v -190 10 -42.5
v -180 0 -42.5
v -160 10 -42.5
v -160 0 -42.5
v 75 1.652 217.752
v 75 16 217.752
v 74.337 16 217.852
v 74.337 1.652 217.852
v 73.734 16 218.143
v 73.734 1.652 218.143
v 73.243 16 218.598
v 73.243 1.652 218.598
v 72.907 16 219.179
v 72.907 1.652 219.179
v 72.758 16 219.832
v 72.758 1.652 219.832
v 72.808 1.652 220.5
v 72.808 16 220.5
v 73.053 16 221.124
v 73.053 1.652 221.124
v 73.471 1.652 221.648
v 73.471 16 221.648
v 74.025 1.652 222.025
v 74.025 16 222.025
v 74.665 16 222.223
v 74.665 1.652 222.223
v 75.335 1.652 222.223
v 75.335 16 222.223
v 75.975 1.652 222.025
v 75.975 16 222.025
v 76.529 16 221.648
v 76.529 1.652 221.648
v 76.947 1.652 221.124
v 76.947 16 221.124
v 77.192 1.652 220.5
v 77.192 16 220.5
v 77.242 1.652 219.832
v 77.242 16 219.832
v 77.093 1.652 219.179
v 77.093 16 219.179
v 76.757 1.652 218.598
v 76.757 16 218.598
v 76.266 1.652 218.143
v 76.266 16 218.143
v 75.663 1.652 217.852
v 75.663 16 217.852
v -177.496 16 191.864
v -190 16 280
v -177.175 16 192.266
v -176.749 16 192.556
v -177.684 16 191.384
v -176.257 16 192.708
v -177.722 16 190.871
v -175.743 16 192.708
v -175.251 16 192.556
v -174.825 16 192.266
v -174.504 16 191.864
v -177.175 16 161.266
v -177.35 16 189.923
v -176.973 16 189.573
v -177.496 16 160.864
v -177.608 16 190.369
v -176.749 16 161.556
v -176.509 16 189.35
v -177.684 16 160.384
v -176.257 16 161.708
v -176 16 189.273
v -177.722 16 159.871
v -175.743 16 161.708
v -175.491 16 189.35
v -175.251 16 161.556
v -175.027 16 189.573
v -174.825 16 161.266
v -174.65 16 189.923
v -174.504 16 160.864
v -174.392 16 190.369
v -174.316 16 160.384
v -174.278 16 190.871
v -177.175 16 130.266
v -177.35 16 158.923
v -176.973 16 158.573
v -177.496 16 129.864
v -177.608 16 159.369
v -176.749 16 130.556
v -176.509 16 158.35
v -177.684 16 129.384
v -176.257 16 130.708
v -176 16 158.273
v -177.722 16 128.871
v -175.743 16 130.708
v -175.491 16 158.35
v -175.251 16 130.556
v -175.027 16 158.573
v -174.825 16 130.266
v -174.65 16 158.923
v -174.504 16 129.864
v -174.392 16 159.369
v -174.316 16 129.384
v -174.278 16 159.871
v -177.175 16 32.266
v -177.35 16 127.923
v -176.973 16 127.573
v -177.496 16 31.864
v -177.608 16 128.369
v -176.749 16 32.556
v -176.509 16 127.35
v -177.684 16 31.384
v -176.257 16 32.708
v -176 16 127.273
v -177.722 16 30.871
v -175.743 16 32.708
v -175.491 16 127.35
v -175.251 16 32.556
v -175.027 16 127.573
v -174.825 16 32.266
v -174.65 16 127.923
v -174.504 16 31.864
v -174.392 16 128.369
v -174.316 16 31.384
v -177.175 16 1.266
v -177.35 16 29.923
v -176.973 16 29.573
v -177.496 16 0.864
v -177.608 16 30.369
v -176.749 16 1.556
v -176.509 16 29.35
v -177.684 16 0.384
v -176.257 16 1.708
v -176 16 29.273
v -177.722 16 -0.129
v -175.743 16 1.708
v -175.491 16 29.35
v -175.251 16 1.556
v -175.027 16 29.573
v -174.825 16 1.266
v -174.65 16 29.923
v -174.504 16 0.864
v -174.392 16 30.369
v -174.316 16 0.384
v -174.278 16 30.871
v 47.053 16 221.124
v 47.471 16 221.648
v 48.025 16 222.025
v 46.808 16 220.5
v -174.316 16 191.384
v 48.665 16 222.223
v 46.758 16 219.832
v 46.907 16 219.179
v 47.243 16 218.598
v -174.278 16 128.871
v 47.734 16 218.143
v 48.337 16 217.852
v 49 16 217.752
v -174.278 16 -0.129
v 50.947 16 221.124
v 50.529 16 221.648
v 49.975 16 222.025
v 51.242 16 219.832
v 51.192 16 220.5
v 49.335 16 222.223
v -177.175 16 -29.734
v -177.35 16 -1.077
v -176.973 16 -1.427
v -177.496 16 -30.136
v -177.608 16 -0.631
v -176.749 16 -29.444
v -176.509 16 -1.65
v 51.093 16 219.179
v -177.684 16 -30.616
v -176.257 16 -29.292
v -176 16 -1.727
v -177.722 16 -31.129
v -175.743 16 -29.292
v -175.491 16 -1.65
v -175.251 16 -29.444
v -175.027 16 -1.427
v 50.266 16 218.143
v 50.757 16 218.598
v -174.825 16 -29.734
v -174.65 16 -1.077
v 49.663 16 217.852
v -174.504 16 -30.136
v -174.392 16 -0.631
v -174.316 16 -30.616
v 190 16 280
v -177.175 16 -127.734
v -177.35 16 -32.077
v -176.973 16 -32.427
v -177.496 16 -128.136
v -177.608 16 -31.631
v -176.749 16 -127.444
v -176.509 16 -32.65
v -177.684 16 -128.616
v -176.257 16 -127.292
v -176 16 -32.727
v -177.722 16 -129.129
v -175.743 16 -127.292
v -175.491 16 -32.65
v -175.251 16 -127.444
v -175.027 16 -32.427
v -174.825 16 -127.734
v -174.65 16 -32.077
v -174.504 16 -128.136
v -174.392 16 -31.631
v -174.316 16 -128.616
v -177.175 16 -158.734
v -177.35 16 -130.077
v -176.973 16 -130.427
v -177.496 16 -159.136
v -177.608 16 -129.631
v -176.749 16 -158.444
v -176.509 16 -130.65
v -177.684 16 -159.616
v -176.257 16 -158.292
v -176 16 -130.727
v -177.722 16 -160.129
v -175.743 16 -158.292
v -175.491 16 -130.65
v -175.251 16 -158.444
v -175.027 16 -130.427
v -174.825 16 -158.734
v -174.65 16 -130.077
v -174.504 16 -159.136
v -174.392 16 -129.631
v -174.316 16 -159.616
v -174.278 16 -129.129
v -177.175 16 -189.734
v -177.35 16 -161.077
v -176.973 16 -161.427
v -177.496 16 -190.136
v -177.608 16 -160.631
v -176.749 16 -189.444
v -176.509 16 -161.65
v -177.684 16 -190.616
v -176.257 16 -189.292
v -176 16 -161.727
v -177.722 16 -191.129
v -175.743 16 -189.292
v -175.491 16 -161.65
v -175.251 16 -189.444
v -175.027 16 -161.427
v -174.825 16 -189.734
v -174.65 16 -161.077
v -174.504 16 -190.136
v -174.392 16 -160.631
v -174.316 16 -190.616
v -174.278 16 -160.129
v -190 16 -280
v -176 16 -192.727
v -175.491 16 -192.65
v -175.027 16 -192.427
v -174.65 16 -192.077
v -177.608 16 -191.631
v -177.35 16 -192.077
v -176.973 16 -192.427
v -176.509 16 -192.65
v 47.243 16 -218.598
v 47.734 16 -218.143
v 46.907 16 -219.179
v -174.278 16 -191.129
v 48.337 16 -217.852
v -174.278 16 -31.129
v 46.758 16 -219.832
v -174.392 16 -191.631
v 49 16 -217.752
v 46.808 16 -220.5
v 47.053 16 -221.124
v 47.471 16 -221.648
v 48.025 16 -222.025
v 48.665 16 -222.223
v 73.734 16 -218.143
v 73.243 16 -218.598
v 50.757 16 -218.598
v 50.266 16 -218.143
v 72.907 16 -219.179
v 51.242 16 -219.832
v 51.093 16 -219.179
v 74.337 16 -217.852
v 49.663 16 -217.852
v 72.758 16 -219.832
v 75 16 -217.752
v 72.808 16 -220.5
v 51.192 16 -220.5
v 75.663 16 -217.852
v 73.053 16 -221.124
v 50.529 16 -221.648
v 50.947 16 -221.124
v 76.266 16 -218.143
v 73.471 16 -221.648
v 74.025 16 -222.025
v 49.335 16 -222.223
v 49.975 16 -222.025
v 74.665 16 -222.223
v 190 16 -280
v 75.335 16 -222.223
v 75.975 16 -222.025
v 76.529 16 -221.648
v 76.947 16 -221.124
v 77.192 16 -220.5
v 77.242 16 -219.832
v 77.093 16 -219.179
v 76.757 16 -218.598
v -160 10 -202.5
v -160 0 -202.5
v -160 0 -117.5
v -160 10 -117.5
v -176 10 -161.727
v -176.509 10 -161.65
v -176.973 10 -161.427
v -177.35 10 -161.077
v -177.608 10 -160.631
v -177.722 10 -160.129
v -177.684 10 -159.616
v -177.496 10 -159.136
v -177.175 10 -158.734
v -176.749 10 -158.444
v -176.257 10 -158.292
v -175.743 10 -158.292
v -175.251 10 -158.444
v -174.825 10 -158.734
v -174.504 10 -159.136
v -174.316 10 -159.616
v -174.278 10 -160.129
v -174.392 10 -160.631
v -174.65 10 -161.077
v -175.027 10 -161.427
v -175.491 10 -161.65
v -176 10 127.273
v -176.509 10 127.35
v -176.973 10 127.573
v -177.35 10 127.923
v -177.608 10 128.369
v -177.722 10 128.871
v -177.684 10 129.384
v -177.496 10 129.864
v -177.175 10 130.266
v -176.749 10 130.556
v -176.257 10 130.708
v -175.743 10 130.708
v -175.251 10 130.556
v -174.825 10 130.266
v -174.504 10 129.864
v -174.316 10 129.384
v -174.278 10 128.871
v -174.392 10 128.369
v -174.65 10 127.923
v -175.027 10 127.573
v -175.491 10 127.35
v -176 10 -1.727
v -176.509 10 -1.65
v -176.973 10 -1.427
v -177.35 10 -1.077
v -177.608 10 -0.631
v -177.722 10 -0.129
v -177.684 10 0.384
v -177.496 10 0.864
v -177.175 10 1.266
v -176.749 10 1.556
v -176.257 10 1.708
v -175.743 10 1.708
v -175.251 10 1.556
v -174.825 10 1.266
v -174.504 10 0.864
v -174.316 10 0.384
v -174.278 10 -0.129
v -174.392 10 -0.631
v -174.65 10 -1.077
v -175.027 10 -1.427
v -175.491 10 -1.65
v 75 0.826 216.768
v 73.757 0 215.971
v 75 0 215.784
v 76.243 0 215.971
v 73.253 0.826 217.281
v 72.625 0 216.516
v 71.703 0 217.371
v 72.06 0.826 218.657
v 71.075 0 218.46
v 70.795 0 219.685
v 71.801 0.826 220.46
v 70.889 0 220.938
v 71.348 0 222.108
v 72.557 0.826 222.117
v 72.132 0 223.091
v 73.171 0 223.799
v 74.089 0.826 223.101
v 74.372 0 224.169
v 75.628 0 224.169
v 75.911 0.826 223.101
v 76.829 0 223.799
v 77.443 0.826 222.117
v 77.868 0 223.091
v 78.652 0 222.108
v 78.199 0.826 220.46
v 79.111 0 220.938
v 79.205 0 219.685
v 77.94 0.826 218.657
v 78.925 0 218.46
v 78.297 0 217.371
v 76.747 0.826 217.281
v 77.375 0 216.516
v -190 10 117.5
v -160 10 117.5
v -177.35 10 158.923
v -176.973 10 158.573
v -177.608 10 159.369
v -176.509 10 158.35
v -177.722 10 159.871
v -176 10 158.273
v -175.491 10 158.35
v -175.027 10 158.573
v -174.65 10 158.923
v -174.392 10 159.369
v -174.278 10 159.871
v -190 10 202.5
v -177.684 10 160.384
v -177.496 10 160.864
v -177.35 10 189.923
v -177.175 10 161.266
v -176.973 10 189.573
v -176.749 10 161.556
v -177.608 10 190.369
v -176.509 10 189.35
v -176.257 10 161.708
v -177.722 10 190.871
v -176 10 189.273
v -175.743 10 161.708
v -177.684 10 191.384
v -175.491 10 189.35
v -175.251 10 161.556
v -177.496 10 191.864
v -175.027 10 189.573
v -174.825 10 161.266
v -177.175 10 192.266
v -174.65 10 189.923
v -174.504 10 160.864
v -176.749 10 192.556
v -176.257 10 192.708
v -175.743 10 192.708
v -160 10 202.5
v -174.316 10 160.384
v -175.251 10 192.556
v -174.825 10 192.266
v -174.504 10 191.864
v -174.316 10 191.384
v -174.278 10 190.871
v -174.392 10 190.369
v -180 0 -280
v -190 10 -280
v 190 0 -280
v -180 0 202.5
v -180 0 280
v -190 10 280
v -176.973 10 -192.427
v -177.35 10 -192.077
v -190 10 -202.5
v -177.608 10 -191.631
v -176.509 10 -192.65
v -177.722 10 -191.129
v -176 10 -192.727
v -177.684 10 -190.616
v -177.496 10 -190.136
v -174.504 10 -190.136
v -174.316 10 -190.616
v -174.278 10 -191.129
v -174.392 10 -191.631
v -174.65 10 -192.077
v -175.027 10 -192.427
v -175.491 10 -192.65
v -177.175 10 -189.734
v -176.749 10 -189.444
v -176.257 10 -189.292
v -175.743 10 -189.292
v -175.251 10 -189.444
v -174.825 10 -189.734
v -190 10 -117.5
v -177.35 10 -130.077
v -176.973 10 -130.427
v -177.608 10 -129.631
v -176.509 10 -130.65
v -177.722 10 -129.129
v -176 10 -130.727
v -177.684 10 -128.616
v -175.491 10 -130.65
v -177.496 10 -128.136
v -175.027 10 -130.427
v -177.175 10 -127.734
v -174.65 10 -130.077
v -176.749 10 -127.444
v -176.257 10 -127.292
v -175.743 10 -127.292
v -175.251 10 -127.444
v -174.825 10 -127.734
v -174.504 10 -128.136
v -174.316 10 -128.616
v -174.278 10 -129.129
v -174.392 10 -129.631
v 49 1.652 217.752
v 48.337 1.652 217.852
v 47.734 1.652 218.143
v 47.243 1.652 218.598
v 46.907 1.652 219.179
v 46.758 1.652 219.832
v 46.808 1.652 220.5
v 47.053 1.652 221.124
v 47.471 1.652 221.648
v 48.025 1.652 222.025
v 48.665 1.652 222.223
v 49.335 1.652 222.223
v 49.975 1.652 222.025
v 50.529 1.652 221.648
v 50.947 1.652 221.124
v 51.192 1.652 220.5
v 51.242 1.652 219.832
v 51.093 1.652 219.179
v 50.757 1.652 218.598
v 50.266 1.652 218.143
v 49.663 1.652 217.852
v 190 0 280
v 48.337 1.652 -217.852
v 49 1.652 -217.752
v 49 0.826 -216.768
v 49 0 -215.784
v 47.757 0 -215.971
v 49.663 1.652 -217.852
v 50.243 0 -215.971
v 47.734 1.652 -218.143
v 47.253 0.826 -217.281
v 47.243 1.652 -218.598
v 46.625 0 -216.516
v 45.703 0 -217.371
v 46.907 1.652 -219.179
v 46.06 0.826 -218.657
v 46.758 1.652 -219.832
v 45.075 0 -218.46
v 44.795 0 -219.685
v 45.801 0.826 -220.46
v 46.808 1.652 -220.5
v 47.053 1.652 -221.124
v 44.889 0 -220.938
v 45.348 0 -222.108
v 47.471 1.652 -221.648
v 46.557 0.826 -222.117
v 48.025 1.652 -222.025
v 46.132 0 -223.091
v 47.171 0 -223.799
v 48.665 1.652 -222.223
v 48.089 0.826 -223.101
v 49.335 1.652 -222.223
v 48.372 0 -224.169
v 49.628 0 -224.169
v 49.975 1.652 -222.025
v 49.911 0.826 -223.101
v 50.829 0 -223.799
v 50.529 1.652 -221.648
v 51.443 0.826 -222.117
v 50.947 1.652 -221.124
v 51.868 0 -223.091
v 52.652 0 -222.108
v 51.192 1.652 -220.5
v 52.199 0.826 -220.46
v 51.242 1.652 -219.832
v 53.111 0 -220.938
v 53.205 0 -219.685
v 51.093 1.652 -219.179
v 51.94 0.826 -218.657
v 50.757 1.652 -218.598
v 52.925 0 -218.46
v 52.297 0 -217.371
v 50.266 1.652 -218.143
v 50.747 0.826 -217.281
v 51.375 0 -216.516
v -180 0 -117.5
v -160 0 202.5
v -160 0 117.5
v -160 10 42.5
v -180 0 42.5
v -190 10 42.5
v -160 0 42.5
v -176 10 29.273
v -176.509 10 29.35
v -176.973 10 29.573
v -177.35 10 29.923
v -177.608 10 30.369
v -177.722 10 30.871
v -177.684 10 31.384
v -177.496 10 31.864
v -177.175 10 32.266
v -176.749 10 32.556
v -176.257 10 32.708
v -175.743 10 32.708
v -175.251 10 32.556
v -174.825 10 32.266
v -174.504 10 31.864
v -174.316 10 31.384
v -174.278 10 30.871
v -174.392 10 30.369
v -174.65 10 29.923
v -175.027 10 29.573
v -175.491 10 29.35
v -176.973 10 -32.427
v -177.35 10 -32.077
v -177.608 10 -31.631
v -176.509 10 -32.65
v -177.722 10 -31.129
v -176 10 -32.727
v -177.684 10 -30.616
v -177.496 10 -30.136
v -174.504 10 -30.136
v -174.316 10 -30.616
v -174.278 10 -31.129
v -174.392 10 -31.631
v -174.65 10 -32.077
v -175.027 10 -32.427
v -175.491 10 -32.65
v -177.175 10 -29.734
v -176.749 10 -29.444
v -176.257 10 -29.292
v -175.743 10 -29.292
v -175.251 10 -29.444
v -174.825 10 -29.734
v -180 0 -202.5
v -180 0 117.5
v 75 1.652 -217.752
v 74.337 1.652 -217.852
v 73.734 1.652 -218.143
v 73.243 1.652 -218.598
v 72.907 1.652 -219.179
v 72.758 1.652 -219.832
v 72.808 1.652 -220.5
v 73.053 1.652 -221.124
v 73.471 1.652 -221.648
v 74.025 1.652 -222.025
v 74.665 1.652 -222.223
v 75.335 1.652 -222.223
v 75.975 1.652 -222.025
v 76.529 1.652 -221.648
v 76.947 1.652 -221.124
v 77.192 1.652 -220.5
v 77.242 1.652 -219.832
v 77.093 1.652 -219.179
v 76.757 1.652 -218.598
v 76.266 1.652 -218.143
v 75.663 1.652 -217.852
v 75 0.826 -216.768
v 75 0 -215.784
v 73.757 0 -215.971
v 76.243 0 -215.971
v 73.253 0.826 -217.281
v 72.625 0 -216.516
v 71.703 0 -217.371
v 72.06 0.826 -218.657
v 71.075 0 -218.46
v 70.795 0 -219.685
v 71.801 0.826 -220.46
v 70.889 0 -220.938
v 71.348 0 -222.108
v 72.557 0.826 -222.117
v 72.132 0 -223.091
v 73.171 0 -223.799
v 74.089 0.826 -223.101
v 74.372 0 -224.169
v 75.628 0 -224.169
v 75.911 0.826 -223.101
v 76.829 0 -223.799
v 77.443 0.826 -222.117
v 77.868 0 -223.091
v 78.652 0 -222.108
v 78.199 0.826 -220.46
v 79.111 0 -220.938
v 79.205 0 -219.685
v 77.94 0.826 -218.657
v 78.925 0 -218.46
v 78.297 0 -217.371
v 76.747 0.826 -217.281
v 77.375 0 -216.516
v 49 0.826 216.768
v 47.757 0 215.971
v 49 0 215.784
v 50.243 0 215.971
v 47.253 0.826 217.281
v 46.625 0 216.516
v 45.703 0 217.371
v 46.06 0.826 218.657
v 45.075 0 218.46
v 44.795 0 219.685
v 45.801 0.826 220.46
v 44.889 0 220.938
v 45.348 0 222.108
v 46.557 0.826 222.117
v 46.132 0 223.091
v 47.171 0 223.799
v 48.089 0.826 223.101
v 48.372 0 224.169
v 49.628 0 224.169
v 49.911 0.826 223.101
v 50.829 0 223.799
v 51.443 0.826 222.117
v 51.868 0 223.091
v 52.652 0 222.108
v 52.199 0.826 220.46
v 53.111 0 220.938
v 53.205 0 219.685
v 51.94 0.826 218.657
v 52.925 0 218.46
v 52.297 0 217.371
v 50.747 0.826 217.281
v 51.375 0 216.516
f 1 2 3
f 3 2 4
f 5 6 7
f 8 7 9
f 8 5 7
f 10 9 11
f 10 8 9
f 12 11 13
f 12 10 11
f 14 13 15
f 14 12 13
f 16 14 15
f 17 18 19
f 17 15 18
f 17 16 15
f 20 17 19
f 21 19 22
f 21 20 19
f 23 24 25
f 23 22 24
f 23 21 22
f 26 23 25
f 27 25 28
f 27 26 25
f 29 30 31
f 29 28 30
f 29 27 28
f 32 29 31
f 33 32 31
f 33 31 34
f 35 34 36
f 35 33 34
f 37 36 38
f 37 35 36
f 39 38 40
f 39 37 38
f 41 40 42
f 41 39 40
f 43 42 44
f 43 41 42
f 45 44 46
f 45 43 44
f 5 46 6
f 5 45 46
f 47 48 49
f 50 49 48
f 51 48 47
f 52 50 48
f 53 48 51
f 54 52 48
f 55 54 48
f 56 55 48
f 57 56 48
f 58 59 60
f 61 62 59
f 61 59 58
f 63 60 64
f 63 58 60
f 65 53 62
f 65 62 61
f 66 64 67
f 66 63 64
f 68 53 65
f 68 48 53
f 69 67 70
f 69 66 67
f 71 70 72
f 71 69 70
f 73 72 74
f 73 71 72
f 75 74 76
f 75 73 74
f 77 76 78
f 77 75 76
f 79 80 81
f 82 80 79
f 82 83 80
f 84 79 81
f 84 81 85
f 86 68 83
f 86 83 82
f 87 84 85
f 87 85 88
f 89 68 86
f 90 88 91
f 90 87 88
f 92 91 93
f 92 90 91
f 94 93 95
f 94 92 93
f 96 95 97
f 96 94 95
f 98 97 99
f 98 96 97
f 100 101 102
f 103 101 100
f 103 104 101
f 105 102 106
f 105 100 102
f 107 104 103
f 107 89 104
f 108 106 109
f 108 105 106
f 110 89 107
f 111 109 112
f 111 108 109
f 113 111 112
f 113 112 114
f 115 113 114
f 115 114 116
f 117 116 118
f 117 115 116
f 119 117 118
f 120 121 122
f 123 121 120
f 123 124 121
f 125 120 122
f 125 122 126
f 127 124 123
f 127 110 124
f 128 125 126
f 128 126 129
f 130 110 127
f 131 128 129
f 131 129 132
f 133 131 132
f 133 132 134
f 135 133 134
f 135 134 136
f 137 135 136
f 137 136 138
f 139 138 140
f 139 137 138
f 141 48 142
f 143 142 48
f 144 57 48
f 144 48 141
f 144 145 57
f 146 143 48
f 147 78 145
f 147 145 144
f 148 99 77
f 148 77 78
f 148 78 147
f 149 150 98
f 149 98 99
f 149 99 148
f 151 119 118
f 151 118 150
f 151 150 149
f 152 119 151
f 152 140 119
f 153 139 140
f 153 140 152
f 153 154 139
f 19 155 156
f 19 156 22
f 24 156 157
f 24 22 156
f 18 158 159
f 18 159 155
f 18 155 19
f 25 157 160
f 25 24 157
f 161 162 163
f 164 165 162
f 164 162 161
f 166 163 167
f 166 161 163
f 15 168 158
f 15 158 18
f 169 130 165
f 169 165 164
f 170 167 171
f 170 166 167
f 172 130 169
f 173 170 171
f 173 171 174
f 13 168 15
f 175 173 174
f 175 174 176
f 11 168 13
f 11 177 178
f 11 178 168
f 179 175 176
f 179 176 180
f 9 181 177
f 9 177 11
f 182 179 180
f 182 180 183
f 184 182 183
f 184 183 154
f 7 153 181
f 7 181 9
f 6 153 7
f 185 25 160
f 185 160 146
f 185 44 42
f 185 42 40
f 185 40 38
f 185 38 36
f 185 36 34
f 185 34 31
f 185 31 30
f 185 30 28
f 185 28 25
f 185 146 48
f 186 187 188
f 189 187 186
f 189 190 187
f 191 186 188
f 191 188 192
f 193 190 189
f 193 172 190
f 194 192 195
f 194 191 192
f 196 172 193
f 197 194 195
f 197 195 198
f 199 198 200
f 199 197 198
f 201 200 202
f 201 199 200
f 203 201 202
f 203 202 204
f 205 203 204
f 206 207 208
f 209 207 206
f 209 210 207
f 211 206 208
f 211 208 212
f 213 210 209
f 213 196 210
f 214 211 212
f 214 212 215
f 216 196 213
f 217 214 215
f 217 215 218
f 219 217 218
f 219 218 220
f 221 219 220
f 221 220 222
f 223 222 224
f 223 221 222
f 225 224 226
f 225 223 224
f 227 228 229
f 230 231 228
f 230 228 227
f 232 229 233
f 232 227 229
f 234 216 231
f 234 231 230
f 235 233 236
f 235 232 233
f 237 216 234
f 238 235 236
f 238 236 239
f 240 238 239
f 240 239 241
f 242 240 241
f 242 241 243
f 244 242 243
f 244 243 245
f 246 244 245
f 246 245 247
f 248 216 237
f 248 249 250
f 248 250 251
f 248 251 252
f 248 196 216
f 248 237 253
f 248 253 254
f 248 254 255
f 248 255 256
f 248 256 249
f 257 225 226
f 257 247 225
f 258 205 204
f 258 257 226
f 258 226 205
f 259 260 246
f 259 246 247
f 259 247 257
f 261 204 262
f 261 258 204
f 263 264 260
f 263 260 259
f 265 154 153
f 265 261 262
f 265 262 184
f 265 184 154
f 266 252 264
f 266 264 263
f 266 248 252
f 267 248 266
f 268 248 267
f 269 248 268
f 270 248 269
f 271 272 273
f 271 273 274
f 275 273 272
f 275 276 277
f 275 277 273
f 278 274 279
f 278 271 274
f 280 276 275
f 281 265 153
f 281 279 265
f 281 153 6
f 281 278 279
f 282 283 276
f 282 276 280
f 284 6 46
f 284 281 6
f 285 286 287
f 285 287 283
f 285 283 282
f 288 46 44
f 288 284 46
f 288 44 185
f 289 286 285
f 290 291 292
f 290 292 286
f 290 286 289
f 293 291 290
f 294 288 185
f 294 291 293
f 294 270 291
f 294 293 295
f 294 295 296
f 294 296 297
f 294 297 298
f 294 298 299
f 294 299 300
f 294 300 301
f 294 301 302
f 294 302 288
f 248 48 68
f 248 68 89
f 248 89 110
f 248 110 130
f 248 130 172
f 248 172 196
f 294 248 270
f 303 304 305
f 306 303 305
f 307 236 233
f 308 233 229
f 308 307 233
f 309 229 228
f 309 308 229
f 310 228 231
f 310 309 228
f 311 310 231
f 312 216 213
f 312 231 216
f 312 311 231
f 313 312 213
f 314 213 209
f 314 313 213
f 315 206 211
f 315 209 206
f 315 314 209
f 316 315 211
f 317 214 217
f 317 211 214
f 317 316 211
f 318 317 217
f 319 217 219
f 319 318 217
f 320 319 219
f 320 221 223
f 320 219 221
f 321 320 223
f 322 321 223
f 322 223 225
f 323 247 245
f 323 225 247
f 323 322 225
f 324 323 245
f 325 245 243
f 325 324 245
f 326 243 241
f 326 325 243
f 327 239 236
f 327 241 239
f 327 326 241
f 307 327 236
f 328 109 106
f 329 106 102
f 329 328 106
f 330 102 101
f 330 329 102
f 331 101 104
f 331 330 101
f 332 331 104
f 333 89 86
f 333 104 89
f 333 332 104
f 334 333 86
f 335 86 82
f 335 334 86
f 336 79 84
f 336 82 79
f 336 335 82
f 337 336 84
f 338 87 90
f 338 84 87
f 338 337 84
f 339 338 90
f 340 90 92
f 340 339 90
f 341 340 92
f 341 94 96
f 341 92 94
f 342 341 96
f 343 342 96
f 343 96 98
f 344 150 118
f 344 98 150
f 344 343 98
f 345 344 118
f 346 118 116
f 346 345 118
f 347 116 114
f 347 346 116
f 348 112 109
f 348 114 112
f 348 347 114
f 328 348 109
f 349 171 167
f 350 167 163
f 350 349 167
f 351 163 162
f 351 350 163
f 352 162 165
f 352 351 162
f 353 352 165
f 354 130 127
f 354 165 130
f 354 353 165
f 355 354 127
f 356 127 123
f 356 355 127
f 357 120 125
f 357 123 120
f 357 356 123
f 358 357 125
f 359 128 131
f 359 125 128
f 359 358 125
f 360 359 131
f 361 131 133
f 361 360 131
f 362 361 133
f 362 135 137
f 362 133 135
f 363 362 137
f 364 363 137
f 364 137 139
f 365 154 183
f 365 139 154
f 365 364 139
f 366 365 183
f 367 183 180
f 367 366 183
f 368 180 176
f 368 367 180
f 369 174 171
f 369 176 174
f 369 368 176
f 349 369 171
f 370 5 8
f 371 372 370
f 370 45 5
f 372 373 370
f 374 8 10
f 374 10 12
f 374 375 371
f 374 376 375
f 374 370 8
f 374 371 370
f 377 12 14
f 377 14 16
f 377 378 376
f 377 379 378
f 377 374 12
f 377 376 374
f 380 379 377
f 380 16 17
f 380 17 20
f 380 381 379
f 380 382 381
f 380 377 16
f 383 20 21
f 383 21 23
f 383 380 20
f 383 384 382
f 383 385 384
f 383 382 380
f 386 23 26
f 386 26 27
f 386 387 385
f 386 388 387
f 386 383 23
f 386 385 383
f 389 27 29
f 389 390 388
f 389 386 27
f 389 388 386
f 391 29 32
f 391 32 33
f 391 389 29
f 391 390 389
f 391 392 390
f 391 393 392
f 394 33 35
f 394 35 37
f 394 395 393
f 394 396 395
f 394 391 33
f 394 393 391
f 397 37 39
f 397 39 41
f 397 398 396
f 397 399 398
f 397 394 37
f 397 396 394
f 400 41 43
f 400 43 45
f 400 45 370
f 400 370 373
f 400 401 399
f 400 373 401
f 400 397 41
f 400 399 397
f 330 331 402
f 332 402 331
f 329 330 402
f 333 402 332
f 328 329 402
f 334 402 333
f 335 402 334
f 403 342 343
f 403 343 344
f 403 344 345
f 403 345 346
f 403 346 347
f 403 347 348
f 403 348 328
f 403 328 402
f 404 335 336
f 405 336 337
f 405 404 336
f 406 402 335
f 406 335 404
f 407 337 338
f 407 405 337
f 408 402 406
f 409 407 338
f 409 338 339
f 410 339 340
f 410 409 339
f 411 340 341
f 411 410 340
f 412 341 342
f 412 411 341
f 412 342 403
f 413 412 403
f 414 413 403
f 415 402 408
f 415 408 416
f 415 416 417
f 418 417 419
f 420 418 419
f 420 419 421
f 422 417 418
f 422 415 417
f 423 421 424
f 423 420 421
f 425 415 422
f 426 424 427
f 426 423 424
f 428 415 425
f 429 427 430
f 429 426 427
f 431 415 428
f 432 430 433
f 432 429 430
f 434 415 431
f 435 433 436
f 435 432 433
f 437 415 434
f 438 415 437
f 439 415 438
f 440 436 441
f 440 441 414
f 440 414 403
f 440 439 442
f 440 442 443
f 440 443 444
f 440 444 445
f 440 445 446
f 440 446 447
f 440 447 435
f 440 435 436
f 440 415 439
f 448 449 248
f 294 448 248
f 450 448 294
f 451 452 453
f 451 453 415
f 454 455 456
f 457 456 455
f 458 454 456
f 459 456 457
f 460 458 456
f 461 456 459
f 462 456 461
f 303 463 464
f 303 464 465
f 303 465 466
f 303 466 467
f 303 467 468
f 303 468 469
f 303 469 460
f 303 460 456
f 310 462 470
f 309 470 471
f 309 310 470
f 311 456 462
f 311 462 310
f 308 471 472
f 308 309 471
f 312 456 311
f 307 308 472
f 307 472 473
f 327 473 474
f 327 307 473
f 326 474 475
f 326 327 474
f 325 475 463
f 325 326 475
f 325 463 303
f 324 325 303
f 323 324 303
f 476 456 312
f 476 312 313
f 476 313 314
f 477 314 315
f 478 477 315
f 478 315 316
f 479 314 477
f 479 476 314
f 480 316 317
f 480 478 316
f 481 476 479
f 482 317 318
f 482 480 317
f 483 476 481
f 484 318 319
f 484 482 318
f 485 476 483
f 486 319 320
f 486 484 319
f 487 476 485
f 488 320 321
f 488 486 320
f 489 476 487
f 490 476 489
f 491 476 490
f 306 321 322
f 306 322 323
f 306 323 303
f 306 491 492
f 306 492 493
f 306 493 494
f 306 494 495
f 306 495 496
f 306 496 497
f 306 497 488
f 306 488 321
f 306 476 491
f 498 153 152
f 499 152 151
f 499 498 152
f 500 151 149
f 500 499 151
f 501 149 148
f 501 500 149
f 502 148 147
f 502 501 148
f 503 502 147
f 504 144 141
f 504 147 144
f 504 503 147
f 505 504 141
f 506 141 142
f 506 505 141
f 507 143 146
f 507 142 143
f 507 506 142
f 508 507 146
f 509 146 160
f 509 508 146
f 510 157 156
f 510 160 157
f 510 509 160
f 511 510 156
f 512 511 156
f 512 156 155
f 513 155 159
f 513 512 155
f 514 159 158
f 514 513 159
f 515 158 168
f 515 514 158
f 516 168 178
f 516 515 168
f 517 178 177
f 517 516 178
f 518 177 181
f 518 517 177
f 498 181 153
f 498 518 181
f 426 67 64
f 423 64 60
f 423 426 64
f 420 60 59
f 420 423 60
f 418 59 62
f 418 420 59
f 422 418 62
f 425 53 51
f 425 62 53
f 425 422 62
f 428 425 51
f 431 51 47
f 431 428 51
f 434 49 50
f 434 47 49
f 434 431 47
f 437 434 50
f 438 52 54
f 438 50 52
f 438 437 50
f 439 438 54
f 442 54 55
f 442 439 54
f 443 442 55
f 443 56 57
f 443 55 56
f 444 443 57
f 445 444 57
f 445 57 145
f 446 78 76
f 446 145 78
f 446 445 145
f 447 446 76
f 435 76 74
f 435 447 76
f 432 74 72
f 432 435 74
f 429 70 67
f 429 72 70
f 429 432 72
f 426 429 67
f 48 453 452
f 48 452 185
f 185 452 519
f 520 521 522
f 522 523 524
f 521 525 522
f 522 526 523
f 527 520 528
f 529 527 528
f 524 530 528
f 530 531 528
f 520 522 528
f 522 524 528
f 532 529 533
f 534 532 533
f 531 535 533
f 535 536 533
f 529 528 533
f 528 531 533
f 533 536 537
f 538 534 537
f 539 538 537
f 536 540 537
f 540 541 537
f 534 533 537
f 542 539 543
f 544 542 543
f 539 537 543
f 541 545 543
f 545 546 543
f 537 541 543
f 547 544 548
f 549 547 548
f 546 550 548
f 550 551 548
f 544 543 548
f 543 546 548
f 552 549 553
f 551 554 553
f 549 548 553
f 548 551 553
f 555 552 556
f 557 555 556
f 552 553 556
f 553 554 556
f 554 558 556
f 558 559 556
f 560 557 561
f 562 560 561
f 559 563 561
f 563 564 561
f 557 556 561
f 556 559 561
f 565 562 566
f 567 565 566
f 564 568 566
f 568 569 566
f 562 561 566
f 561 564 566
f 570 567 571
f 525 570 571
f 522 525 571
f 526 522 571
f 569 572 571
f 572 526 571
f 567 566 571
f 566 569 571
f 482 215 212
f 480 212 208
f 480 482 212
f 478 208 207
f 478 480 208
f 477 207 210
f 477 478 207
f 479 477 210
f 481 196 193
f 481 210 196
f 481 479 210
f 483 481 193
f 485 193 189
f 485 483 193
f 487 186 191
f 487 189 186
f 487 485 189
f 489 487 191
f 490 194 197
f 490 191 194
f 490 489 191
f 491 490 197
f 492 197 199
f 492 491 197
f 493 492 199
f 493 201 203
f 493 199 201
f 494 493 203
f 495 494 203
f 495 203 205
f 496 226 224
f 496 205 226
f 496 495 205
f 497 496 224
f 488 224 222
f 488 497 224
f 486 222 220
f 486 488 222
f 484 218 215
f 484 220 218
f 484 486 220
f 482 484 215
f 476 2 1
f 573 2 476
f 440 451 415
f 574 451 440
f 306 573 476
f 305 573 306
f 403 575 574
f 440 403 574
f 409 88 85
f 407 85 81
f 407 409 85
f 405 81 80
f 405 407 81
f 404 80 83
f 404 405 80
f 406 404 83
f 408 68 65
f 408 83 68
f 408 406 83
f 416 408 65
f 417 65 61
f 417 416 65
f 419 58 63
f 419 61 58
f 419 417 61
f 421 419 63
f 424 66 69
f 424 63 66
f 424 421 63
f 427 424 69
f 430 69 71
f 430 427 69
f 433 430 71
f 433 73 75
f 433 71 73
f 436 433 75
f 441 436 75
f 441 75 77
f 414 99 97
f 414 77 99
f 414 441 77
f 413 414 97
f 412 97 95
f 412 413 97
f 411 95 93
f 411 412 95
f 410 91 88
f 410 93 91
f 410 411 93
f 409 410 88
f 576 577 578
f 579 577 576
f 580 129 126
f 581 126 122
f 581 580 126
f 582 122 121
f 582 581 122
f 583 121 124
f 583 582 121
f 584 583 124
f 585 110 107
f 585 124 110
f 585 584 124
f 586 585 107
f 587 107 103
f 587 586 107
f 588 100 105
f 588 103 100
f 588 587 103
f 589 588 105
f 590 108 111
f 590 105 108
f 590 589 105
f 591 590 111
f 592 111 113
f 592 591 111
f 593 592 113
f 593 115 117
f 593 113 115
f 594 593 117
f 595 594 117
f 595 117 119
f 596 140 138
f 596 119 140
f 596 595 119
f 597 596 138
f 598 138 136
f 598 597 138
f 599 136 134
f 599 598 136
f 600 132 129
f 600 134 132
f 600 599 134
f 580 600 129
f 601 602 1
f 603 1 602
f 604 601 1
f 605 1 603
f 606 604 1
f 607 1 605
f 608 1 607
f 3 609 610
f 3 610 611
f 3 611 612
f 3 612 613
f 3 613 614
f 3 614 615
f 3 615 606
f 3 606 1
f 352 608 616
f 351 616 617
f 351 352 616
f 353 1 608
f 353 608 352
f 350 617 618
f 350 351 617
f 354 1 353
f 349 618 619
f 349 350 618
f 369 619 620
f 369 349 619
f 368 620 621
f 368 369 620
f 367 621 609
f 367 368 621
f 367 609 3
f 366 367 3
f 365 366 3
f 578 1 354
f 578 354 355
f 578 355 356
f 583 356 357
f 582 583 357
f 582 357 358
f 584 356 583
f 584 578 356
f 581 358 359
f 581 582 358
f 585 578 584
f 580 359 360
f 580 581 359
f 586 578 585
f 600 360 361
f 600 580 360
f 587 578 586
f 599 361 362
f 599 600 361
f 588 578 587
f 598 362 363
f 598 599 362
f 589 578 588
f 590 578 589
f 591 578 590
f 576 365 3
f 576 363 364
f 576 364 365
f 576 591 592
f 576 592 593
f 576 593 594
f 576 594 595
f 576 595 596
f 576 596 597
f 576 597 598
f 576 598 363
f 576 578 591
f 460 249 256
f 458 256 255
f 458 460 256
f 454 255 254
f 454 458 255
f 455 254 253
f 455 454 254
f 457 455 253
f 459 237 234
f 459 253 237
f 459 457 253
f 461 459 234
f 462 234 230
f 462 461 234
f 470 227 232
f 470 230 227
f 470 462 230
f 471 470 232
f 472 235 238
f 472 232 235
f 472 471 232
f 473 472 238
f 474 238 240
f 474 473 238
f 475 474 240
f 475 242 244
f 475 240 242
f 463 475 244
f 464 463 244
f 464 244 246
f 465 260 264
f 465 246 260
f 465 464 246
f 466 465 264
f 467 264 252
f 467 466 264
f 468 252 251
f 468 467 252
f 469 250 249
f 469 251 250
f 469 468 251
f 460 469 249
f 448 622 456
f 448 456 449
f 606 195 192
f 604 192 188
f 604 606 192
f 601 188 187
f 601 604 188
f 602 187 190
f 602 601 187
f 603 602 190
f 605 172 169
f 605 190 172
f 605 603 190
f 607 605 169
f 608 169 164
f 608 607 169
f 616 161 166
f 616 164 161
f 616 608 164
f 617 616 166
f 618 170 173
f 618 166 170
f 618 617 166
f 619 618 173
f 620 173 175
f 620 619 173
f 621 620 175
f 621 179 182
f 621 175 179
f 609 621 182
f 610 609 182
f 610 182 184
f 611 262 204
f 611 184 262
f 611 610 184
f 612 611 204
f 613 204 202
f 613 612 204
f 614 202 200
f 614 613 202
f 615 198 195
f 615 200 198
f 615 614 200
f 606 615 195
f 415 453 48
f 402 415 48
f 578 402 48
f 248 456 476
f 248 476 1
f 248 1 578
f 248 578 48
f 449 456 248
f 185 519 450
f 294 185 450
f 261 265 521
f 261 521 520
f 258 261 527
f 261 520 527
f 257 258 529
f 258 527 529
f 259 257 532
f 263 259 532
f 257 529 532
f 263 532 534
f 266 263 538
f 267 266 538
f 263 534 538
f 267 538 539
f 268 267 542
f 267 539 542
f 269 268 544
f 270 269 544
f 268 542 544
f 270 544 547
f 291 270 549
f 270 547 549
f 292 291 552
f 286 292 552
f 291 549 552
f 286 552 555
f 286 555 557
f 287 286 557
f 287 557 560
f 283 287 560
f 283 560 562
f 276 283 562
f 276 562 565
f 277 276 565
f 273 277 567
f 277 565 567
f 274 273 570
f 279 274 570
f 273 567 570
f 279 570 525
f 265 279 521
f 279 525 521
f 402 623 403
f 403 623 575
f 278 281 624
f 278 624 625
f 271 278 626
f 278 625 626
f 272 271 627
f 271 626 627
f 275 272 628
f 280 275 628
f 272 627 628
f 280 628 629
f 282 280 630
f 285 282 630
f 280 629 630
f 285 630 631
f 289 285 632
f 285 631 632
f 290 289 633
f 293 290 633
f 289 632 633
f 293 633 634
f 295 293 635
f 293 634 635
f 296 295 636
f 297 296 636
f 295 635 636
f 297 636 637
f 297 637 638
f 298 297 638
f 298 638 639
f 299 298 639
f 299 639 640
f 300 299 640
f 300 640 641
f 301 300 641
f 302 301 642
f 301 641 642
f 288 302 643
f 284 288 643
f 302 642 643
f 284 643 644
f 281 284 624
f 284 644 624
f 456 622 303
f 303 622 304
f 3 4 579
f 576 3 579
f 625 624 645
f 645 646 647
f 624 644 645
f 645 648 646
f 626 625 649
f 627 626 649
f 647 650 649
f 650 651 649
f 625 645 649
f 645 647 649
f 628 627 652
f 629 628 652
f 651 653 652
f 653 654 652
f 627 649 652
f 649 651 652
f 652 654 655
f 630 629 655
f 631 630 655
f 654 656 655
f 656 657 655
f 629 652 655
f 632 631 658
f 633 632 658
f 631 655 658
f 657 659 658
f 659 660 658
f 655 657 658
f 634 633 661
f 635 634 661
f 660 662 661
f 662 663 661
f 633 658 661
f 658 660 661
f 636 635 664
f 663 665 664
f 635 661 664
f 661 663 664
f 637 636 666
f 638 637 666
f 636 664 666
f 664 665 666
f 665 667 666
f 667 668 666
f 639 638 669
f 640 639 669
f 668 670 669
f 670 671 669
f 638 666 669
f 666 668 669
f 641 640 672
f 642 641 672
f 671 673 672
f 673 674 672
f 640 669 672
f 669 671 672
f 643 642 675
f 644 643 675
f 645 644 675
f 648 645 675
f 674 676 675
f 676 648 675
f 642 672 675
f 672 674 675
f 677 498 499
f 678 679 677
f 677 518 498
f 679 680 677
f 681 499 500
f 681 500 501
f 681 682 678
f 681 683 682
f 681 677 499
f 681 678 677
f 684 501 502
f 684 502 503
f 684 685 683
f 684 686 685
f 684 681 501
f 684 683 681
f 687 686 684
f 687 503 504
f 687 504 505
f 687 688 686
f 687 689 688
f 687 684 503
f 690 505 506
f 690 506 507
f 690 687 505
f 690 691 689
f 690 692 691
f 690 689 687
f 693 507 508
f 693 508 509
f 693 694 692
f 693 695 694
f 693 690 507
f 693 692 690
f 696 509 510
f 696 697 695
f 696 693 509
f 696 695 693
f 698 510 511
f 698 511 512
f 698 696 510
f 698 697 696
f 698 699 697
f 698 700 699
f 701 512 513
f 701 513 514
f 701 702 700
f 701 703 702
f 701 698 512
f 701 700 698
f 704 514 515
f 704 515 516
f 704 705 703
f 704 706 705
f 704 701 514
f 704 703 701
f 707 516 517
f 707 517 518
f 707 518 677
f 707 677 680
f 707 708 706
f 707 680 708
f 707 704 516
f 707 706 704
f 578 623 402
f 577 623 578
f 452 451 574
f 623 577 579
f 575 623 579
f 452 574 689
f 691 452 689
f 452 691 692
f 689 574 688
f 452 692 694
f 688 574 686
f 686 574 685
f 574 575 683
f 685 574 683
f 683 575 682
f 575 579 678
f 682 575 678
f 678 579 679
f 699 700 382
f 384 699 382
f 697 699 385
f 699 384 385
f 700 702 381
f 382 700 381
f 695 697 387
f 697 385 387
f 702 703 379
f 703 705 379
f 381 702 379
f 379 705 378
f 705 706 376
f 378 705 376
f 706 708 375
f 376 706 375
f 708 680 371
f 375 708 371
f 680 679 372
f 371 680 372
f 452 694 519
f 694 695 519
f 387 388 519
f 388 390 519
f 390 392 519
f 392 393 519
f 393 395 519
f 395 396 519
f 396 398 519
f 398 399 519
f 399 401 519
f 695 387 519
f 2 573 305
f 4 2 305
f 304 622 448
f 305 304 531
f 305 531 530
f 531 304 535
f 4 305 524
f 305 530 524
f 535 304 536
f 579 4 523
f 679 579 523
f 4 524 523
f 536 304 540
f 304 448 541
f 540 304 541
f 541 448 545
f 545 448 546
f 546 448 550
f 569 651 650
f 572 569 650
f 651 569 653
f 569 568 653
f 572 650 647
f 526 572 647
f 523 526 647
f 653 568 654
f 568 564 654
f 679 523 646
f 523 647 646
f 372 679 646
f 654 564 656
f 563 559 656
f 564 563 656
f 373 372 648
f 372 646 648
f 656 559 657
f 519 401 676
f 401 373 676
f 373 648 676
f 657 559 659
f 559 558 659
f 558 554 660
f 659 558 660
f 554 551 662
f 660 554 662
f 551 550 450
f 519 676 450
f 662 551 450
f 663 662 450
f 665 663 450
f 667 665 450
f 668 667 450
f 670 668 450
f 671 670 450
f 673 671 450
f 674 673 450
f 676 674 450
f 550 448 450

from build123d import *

# Parameters (mm, degrees)
SKETCH1_W                                 = 380
SKETCH1_H                                 = 560
BOSS_EXTRUDE1_DEPTH                       = 16
SKETCH2_W                                 = 30
SKETCH2_H                                 = 85
CUT_EXTRUDE1_DEPTH                        = 10
CHAMFER2_SIZE                             = 10
F_8_36_TAPPED_HOLE1_AT_2_COUNT            = 2
F_8_36_TAPPED_HOLE1_AT_2_PITCH            = 31
F_8_36_TAPPED_HOLE1_AT_3_COUNT            = 2
F_8_36_TAPPED_HOLE1_AT_3_PITCH            = 62
LPATTERN1_COUNT                           = 3
LPATTERN1_PITCH                           = 160
CSK_FOR_8_FLAT_HEAD_MACHINE_SCREW_2_COUNT = 2
CSK_FOR_8_FLAT_HEAD_MACHINE_SCREW_2_PITCH = 26


with BuildPart() as part:
    # Sketch1 → Boss-Extrude1 (new body)
    with BuildSketch(Plane(origin=(0, 0, 0), x_dir=(1, 0, 0), z_dir=(0, 1, 0))):
        Rectangle(SKETCH1_W, SKETCH1_H)
    extrude(amount=BOSS_EXTRUDE1_DEPTH)

    # Sketch2 → Cut-Extrude1 (cut)
    with BuildSketch(Plane.XZ):
        with Locations((-175, 160)):
            Rectangle(SKETCH2_W, SKETCH2_H)
        with Locations((-175, 0)):
            Rectangle(SKETCH2_W, SKETCH2_H)
        with Locations((-175, -160)):
            Rectangle(SKETCH2_W, SKETCH2_H)
    extrude(amount=-CUT_EXTRUDE1_DEPTH, mode=Mode.SUBTRACT)

    # Chamfer2
    chamfer2_edges = [part.edges().sort_by_distance(p)[0] for p in [
        (-190, 0, 241.25),
        (-190, 0, 80),
        (-190, 0, -80),
        (-190, 0, -241.25),
    ]]
    chamfer(chamfer2_edges, length=CHAMFER2_SIZE)

    # Sketch5 → #8-36 Tapped Hole1 (revolve, cut)
    with BuildSketch(Plane(origin=(-176, 10, 191), x_dir=(0, 0, -1), z_dir=(1, 0, 0))):
        Polygon((0, 0), (0, 26.037806461), (1.7272, 25), (1.7272, 0), align=None)
    f_8_36_tapped_hole1 = revolve(axis=Axis((-176, 3.65, 191), (0, 1, 0)), mode=Mode.SUBTRACT)

    # #8-36 Tapped Hole1 at 2: #8-36 Tapped Hole1 ×2
    with Locations(*[(0, 0, -i * F_8_36_TAPPED_HOLE1_AT_2_PITCH) for i in range(1, F_8_36_TAPPED_HOLE1_AT_2_COUNT)]):
        add(f_8_36_tapped_hole1, mode=Mode.SUBTRACT)

    # #8-36 Tapped Hole1 at 3: #8-36 Tapped Hole1 ×2
    with Locations(*[(0, 0, -i * F_8_36_TAPPED_HOLE1_AT_3_PITCH) for i in range(1, F_8_36_TAPPED_HOLE1_AT_3_COUNT)]):
        add(f_8_36_tapped_hole1, mode=Mode.SUBTRACT)

    # LPattern1: #8-36 Tapped Hole1 ×3
    with Locations(*[(0, 0, -i * LPATTERN1_PITCH) for i in range(1, LPATTERN1_COUNT)]):
        add(f_8_36_tapped_hole1, mode=Mode.SUBTRACT)

    # LPattern1 copy 1 sketch → LPattern1 copy 1 (revolve, cut)
    with BuildSketch(Plane(origin=(-176, 10, 0), x_dir=(0, 0, -1), z_dir=(1, 0, 0))):
        Polygon((0, 0), (0, 26.037806461), (1.7272, 25), (1.7272, 0), align=None)
    revolve(axis=Axis((-176, 3.65, 0), (0, 1, 0)), mode=Mode.SUBTRACT)

    # LPattern1 copy 2 sketch → LPattern1 copy 2 (revolve, cut)
    with BuildSketch(Plane(origin=(-176, 10, -160), x_dir=(0, 0, -1), z_dir=(1, 0, 0))):
        Polygon((0, 0), (0, 26.037806461), (1.7272, 25), (1.7272, 0), align=None)
    revolve(axis=Axis((-176, 3.65, -160), (0, 1, 0)), mode=Mode.SUBTRACT)

    # LPattern1 copy 3 sketch → LPattern1 copy 3 (revolve, cut)
    with BuildSketch(Plane(origin=(-176, 10, -31), x_dir=(0, 0, -1), z_dir=(1, 0, 0))):
        Polygon((0, 0), (0, 26.037806461), (1.7272, 25), (1.7272, 0), align=None)
    revolve(axis=Axis((-176, 3.65, -31), (0, 1, 0)), mode=Mode.SUBTRACT)

    # LPattern1 copy 4 sketch → LPattern1 copy 4 (revolve, cut)
    with BuildSketch(Plane(origin=(-176, 10, -191), x_dir=(0, 0, -1), z_dir=(1, 0, 0))):
        Polygon((0, 0), (0, 26.037806461), (1.7272, 25), (1.7272, 0), align=None)
    revolve(axis=Axis((-176, 3.65, -191), (0, 1, 0)), mode=Mode.SUBTRACT)

    # Sketch8 → CSK for #8 Flat Head Machine Screw (100)1 (revolve, cut)
    with BuildSketch(Plane(origin=(75, 0, 220), x_dir=(0, 0, -1), z_dir=(1, 0, 0))):
        Polygon((0, 0), (0, 26.350674586), (2.2479, 25), (2.2479, 1.651767624), (4.2164, 0), align=None)
    csk_for_8_flat_head_machine_screw_100 = revolve(axis=Axis((75, -6.35, 220), (0, 1, 0)), mode=Mode.SUBTRACT)

    # CSK for _8 Flat Head Machine Screw _ 2: CSK for #8 Flat Head Machine Screw (100)1 ×2
    with Locations(*[(-i * CSK_FOR_8_FLAT_HEAD_MACHINE_SCREW_2_PITCH, 0, 0) for i in range(1, CSK_FOR_8_FLAT_HEAD_MACHINE_SCREW_2_COUNT)]):
        add(csk_for_8_flat_head_machine_screw_100, mode=Mode.SUBTRACT)

    # Mirror1: CSK for #8 Flat Head Machine Screw (100)1 across plane
    add(csk_for_8_flat_head_machine_screw_100.mirror(Plane.XY), mode=Mode.SUBTRACT)

    # Mirror1 copy 1 sketch → Mirror1 copy 1 (revolve, cut)
    with BuildSketch(Plane(origin=(49, 0, -220), x_dir=(0, 0, 1), z_dir=(1, 0, 0))):
        Polygon((0, 0), (0, -26.350674586), (2.2479, -25), (2.2479, -1.651767624), (4.2164, 0), align=None)
    revolve(axis=Axis((49, -6.35, -220), (0, -1, 0)), mode=Mode.SUBTRACT)


solid = part.part
